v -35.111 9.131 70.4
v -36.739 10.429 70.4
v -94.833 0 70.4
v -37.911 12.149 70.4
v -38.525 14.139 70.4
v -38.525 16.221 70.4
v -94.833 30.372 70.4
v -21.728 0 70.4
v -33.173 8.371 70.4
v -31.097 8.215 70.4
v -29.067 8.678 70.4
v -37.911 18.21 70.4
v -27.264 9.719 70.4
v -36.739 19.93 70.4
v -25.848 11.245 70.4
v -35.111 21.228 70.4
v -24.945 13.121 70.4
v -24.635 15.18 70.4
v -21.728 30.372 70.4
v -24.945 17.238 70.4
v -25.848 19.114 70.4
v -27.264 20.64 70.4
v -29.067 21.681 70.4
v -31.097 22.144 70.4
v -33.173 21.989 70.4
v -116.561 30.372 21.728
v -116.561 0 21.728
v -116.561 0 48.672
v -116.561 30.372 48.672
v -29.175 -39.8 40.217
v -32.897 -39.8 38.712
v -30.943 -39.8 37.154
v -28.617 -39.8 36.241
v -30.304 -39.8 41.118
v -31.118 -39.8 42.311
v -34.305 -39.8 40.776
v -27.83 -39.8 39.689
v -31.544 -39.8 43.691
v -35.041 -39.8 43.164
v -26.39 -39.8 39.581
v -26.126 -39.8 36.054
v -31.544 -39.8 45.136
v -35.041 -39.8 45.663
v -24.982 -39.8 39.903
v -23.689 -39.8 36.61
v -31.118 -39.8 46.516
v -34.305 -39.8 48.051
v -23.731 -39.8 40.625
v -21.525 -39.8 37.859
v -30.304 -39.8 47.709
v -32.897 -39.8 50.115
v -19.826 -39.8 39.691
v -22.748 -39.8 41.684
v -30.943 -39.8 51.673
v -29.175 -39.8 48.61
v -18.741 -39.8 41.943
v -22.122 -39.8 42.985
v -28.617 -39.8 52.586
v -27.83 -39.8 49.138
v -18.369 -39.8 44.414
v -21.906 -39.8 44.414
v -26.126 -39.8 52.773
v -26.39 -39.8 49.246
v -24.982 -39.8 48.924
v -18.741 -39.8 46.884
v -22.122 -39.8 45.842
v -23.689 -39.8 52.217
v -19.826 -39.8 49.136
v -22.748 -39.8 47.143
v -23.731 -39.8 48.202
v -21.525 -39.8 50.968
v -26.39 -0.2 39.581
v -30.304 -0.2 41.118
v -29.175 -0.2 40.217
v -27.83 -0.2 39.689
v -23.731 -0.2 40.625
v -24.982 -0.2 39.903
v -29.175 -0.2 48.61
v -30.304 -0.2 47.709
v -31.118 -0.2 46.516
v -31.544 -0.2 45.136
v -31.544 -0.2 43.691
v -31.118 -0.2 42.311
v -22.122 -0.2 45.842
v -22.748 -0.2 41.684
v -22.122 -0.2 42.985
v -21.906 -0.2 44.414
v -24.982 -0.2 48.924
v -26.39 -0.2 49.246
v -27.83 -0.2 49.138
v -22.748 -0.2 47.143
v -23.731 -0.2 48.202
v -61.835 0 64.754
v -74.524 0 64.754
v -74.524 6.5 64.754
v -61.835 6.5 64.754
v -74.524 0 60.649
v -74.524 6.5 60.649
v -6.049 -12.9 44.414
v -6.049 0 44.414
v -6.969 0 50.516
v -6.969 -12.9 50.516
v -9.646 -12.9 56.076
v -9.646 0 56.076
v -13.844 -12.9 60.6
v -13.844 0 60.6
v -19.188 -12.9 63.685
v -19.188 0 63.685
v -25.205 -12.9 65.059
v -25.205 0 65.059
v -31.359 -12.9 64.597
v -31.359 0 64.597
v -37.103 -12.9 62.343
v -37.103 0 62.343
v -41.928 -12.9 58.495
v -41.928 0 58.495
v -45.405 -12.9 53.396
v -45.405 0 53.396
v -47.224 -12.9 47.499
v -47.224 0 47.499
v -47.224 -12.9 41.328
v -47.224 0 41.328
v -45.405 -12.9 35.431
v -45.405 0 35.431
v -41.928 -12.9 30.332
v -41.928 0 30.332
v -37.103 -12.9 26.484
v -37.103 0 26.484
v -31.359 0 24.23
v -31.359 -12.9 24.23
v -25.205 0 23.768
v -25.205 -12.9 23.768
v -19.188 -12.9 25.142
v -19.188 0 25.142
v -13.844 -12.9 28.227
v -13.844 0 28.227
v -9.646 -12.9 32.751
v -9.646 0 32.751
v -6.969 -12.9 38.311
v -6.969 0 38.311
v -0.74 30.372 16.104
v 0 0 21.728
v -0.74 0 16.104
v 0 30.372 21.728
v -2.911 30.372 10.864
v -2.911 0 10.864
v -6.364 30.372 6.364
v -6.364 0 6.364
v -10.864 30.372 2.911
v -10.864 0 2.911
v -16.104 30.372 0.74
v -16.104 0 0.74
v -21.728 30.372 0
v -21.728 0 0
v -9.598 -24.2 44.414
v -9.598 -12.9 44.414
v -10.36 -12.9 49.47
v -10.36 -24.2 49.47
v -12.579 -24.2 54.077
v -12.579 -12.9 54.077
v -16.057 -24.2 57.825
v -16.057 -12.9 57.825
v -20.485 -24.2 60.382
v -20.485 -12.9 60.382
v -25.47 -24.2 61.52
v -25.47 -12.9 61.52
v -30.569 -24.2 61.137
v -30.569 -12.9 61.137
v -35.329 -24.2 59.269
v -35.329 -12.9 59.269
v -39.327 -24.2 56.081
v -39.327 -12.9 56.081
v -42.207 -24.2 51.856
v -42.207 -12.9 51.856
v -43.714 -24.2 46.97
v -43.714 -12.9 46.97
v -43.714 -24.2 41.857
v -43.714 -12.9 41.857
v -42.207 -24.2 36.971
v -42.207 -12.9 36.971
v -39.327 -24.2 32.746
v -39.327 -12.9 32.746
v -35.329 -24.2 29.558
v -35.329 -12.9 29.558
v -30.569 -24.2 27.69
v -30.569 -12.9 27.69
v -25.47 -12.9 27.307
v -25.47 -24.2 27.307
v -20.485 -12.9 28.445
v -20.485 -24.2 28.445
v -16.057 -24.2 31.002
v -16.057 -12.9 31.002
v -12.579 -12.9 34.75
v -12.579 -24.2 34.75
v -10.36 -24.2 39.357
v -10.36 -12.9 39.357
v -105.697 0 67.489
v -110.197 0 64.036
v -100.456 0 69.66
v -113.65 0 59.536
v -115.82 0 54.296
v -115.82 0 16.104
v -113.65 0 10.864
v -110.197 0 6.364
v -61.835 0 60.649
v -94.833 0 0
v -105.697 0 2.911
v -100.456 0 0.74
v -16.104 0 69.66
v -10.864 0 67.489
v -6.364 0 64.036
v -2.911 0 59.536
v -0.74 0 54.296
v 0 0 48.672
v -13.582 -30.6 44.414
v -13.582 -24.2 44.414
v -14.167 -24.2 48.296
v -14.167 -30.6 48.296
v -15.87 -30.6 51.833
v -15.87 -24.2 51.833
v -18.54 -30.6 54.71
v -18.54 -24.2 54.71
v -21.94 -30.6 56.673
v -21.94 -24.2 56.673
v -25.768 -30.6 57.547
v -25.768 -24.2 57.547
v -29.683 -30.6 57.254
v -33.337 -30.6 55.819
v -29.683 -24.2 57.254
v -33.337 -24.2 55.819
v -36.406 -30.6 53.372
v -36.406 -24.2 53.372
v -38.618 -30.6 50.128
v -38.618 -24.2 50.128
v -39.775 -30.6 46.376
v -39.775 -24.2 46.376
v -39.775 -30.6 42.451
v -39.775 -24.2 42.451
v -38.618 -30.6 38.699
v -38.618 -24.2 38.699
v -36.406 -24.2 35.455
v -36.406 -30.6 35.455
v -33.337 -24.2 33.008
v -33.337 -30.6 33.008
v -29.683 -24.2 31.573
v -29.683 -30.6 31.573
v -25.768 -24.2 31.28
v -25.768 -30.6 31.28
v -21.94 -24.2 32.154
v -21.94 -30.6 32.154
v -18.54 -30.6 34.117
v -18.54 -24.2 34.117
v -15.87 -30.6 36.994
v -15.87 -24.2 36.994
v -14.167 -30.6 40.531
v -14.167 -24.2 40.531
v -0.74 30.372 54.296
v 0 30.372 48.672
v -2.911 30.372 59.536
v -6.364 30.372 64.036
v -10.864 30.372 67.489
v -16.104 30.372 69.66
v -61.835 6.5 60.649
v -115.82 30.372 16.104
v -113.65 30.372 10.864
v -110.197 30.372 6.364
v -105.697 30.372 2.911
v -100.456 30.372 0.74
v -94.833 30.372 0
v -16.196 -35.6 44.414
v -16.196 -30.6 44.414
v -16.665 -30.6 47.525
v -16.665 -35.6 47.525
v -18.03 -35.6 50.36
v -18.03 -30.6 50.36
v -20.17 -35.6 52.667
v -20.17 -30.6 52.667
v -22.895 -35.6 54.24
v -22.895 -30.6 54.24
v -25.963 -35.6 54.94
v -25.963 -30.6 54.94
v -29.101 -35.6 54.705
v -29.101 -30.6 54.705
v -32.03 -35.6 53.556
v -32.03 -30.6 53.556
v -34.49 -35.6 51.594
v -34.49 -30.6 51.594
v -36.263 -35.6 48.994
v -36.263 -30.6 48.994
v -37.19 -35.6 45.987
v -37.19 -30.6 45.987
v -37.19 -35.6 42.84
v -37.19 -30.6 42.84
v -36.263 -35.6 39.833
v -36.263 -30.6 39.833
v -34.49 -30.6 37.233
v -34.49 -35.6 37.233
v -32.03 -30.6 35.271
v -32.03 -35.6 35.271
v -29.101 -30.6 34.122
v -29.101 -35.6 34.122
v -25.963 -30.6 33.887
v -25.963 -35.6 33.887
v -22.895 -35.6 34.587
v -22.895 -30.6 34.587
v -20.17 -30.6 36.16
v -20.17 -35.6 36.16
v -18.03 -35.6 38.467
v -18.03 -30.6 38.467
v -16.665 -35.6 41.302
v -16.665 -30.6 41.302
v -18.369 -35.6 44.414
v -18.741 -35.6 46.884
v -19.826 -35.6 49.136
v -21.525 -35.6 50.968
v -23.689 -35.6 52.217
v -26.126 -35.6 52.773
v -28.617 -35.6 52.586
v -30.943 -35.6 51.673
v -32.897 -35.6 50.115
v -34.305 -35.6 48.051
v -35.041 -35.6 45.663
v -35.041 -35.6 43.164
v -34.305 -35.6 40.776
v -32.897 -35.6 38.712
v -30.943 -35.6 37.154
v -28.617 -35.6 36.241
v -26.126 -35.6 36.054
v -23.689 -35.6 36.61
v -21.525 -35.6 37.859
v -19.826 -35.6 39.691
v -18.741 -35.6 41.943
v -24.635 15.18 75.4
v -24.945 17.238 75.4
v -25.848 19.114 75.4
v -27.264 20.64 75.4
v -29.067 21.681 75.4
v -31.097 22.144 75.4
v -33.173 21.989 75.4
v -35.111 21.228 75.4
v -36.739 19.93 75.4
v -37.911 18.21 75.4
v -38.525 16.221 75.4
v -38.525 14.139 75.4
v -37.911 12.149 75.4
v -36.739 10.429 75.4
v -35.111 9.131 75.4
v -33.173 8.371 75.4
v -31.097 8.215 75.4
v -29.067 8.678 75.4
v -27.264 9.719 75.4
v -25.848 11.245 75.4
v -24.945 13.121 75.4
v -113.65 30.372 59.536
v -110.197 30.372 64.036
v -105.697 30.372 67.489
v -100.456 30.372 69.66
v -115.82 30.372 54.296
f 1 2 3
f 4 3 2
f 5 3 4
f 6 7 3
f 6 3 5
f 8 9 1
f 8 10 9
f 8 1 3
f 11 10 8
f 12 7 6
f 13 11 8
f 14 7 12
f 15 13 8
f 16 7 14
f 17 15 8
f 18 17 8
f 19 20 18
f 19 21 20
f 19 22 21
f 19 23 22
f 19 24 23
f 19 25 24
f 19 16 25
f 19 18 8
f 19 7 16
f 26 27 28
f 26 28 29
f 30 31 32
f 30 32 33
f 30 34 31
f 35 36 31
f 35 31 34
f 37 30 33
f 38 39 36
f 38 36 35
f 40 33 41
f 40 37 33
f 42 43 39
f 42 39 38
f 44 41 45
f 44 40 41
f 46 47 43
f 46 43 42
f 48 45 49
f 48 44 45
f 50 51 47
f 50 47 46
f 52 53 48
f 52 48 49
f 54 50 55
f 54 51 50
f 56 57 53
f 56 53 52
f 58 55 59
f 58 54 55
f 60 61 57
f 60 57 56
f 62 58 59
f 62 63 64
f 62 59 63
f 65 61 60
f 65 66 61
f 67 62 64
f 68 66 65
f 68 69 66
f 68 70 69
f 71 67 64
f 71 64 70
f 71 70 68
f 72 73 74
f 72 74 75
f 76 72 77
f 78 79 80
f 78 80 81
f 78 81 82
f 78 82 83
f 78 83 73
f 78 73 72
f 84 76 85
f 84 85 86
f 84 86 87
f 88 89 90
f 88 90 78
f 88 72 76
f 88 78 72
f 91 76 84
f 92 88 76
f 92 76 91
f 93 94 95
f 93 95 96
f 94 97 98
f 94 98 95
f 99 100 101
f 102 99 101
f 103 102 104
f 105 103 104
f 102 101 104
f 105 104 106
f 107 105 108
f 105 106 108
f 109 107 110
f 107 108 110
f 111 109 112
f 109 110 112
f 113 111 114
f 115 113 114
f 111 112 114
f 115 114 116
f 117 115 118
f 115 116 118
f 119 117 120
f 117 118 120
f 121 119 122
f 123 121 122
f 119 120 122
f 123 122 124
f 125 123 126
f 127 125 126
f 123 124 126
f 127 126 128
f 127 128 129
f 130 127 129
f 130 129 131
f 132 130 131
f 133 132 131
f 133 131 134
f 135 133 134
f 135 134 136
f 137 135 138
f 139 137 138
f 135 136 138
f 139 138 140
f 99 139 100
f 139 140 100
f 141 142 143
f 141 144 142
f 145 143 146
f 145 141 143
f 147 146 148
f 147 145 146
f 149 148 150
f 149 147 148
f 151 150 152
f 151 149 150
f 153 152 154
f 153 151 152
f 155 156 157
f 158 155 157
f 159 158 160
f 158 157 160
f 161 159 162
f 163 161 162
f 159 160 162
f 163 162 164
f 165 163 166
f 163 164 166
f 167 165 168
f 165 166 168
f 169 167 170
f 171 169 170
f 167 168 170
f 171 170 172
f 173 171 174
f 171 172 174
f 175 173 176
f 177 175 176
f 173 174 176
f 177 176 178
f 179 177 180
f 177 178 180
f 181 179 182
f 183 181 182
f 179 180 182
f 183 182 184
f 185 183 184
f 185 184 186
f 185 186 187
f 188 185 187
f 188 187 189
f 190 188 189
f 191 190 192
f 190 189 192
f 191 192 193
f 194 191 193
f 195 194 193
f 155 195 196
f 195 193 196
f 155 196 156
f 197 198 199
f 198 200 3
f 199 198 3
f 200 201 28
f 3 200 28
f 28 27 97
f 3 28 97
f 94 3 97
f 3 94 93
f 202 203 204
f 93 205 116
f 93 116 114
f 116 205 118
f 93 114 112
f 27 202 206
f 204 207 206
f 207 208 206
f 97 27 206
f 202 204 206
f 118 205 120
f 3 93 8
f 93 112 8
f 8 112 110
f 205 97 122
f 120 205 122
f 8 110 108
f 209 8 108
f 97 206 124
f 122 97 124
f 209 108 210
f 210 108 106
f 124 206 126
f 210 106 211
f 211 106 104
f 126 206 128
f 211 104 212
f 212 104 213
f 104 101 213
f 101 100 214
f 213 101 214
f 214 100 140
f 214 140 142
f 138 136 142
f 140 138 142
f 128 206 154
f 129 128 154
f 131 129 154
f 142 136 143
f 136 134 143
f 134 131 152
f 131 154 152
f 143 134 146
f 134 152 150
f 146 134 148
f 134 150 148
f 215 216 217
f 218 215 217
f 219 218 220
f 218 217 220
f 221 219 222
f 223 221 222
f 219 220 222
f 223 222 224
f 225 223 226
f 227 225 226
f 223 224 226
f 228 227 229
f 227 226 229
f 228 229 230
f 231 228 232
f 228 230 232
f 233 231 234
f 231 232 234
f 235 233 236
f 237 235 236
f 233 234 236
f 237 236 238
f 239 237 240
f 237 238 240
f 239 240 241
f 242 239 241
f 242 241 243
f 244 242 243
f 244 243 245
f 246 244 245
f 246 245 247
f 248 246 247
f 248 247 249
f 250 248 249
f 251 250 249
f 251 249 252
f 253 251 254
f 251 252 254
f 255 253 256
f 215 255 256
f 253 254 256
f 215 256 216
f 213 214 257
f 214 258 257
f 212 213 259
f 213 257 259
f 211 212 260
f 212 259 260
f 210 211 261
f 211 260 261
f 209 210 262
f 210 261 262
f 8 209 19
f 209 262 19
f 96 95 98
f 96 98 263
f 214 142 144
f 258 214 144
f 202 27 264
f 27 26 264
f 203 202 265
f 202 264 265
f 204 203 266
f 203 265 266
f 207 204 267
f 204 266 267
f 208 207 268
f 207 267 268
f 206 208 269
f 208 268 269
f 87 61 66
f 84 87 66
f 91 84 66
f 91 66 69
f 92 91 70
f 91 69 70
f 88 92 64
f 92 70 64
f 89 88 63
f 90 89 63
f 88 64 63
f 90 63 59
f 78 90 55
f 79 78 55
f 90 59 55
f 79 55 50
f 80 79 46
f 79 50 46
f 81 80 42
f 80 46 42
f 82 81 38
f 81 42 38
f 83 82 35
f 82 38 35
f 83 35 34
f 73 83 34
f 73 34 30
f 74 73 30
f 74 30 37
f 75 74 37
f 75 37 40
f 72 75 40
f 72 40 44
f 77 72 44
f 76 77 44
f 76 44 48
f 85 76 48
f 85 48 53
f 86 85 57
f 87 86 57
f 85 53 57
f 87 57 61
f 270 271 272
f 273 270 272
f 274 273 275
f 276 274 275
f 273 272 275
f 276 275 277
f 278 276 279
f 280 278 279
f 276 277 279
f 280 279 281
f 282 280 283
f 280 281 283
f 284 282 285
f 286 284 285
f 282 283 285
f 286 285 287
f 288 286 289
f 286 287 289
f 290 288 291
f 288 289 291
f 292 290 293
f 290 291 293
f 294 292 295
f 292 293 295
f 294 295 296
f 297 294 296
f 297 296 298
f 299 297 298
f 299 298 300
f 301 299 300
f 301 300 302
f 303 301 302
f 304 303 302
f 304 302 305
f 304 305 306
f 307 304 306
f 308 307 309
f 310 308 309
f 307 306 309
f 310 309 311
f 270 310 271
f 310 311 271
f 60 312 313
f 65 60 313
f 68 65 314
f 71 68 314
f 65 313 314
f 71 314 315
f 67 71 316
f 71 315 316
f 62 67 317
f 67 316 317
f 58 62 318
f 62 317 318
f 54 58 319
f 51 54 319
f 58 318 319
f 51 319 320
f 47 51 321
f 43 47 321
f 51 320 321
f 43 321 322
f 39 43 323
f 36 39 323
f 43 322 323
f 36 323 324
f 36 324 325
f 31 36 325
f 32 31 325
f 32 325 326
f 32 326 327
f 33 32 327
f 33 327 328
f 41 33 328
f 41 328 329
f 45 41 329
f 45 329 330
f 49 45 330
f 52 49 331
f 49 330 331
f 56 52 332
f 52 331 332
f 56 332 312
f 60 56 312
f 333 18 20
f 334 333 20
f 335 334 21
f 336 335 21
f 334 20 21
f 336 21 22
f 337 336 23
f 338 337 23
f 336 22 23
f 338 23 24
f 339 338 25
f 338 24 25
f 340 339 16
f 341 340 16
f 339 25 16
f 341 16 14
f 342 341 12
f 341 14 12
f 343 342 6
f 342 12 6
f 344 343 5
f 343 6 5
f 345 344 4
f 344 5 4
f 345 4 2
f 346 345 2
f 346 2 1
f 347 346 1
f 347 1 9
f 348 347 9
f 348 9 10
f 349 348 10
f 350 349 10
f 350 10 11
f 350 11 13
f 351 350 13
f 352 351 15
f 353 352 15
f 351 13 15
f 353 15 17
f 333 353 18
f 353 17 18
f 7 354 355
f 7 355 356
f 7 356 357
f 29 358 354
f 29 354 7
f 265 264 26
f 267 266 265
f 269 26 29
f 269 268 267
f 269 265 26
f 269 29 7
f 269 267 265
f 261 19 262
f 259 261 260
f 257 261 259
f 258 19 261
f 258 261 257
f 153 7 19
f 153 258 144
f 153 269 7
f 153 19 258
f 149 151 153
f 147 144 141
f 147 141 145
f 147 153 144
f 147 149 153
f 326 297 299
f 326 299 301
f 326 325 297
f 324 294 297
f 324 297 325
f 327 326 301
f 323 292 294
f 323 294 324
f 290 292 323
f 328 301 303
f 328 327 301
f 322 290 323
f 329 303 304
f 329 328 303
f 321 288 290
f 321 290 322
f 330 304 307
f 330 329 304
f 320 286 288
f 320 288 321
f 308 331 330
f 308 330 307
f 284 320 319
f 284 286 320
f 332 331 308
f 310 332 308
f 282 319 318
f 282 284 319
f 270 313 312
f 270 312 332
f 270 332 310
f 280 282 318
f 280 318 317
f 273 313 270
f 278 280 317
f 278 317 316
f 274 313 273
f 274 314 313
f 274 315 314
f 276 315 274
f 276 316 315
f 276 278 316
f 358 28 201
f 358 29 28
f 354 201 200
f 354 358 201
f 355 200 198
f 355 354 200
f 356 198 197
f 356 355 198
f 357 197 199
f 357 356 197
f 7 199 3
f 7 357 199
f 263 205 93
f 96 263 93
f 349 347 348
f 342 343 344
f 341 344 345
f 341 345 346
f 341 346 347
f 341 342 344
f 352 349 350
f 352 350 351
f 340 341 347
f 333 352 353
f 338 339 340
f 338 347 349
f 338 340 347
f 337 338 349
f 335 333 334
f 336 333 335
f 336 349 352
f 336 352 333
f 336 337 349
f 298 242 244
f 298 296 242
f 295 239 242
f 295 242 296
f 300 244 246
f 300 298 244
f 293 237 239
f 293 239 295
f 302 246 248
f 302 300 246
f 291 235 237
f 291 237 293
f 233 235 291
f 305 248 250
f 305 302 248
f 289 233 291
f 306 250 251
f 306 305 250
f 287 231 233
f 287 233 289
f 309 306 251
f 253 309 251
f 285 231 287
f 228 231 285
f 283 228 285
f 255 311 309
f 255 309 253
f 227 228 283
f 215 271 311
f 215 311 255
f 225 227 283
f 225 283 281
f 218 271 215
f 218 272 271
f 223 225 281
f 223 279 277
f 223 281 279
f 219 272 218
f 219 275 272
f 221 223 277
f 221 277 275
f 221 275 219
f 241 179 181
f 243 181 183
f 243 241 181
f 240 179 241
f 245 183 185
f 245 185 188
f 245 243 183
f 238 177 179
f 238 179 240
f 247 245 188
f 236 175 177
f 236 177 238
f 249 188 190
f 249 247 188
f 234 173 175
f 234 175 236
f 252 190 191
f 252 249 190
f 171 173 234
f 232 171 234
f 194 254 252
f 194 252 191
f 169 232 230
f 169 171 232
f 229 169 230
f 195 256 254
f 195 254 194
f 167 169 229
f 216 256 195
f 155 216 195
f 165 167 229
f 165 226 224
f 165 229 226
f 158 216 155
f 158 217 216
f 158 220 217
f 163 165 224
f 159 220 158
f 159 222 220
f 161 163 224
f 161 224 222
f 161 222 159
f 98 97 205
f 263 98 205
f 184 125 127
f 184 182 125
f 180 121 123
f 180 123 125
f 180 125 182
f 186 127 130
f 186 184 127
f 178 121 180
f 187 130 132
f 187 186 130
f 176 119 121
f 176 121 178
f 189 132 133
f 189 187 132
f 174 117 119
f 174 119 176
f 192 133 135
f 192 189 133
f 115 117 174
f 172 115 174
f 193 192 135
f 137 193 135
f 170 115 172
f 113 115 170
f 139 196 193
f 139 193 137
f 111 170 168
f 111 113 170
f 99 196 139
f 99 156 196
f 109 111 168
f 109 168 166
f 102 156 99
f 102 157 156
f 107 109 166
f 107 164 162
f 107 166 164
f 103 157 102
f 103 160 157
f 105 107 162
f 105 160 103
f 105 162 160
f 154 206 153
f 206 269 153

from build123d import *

# Parameters (mm, degrees)
F0_W      = 116.5608018637
F0_H      = 30.3723793477
F1_DEPTH  = 70.4
F2_R      = 21.7279220614
F3_R      = 20.7029342891
F4_DEPTH  = 12.9
F5_R      = 17.1540446216
F6_DEPTH  = 11.3
F7_R      = 13.170324084
F8_DEPTH  = 6.4
F9_R      = 10.5563367541
F10_DEPTH = 5
F11_R     = 8.3829862068
F12_DEPTH = 4.2
F13_W     = 12.9023790359
F13_H     = 4.7707334161
F14_DEPTH = 6.7
F15_W     = 13.5998092592
F15_H     = 4.6233572066
F16_DEPTH = 10
F17_W     = 12.6895718277
F17_H     = 4.1054487228
F18_DEPTH = 6.5
F19_R     = 6.9841097136
F20_DEPTH = 5
F21_R     = 4.8457343359
F22_DEPTH = 39.6


with BuildPart() as f1:
    # F0 (on Top) → F1 (new body)
    with BuildSketch(Plane.XY):
        with Locations((-58.2804009318, 15.1861896738)):
            Rectangle(F0_W, F0_H)
    extrude(amount=F1_DEPTH)

    # F2
    f2_edges = [f1.edges().sort_by_distance(p)[0] for p in [
        (-116.560802, 15.18619, 70.4),
        (0, 15.18619, 70.4),
        (-116.560802, 15.18619, 0),
        (0, 15.18619, 0),
    ]]
    fillet(f2_edges, radius=F2_R)

    # F3 (on face) → F4 (join)
    with BuildSketch(Plane.XZ):
        with Locations((-26.7519634217, 44.41351071)):
            Circle(F3_R)
    extrude(amount=F4_DEPTH)

    # F5 (on face) → F6 (join)
    with BuildSketch(Plane.XZ.offset(12.9)):
        with Locations((-26.7519634217, 44.41351071)):
            Circle(F5_R)
    extrude(amount=F6_DEPTH)

    # F7 (on face) → F8 (join)
    with BuildSketch(Plane.XZ.offset(24.2)):
        with Locations((-26.7519634217, 44.41351071)):
            Circle(F7_R)
    extrude(amount=F8_DEPTH)

    # F9 (on face) → F10 (join)
    with BuildSketch(Plane.XZ.offset(30.6)):
        with Locations((-26.7519634217, 44.41351071)):
            Circle(F9_R)
    extrude(amount=F10_DEPTH)

    # F11 (on face) → F12 (join)
    with BuildSketch(Plane.XZ.offset(35.6)):
        with Locations((-26.7519634217, 44.41351071)):
            Circle(F11_R)
    extrude(amount=F12_DEPTH)

    # F13 (on face) → F14 (join)
    with BuildSketch(Plane.XZ):
        with Locations((-53.0363544822, 61.6516061127)):
            Rectangle(F13_W, F13_H)
    extrude(amount=-F14_DEPTH)

    # F15 (on face) → F16 (join)
    with BuildSketch(Plane.XZ):
        with Locations((-61.4054668695, 60.4561474174)):
            Rectangle(F15_W, F15_H)
    extrude(amount=-F16_DEPTH)

    # F17 (on face) → F18 (cut)
    with BuildSketch(Plane.XZ):
        with Locations((-68.1796912104, 62.7014264464)):
            Rectangle(F17_W, F17_H)
    extrude(amount=-F18_DEPTH, mode=Mode.SUBTRACT)

    # F19 (on face) → F20 (join)
    with BuildSketch(Plane.XY.offset(70.4)):
        with Locations((-31.61893785, 15.1796527207)):
            Circle(F19_R)
    extrude(amount=F20_DEPTH)

    # F21 (on face) → F22 (cut)
    with BuildSketch(Plane.XZ.offset(39.8)):
        with Locations((-26.7519634217, 44.41351071)):
            Circle(F21_R)
    extrude(amount=-F22_DEPTH, mode=Mode.SUBTRACT)


solid = f1.part
